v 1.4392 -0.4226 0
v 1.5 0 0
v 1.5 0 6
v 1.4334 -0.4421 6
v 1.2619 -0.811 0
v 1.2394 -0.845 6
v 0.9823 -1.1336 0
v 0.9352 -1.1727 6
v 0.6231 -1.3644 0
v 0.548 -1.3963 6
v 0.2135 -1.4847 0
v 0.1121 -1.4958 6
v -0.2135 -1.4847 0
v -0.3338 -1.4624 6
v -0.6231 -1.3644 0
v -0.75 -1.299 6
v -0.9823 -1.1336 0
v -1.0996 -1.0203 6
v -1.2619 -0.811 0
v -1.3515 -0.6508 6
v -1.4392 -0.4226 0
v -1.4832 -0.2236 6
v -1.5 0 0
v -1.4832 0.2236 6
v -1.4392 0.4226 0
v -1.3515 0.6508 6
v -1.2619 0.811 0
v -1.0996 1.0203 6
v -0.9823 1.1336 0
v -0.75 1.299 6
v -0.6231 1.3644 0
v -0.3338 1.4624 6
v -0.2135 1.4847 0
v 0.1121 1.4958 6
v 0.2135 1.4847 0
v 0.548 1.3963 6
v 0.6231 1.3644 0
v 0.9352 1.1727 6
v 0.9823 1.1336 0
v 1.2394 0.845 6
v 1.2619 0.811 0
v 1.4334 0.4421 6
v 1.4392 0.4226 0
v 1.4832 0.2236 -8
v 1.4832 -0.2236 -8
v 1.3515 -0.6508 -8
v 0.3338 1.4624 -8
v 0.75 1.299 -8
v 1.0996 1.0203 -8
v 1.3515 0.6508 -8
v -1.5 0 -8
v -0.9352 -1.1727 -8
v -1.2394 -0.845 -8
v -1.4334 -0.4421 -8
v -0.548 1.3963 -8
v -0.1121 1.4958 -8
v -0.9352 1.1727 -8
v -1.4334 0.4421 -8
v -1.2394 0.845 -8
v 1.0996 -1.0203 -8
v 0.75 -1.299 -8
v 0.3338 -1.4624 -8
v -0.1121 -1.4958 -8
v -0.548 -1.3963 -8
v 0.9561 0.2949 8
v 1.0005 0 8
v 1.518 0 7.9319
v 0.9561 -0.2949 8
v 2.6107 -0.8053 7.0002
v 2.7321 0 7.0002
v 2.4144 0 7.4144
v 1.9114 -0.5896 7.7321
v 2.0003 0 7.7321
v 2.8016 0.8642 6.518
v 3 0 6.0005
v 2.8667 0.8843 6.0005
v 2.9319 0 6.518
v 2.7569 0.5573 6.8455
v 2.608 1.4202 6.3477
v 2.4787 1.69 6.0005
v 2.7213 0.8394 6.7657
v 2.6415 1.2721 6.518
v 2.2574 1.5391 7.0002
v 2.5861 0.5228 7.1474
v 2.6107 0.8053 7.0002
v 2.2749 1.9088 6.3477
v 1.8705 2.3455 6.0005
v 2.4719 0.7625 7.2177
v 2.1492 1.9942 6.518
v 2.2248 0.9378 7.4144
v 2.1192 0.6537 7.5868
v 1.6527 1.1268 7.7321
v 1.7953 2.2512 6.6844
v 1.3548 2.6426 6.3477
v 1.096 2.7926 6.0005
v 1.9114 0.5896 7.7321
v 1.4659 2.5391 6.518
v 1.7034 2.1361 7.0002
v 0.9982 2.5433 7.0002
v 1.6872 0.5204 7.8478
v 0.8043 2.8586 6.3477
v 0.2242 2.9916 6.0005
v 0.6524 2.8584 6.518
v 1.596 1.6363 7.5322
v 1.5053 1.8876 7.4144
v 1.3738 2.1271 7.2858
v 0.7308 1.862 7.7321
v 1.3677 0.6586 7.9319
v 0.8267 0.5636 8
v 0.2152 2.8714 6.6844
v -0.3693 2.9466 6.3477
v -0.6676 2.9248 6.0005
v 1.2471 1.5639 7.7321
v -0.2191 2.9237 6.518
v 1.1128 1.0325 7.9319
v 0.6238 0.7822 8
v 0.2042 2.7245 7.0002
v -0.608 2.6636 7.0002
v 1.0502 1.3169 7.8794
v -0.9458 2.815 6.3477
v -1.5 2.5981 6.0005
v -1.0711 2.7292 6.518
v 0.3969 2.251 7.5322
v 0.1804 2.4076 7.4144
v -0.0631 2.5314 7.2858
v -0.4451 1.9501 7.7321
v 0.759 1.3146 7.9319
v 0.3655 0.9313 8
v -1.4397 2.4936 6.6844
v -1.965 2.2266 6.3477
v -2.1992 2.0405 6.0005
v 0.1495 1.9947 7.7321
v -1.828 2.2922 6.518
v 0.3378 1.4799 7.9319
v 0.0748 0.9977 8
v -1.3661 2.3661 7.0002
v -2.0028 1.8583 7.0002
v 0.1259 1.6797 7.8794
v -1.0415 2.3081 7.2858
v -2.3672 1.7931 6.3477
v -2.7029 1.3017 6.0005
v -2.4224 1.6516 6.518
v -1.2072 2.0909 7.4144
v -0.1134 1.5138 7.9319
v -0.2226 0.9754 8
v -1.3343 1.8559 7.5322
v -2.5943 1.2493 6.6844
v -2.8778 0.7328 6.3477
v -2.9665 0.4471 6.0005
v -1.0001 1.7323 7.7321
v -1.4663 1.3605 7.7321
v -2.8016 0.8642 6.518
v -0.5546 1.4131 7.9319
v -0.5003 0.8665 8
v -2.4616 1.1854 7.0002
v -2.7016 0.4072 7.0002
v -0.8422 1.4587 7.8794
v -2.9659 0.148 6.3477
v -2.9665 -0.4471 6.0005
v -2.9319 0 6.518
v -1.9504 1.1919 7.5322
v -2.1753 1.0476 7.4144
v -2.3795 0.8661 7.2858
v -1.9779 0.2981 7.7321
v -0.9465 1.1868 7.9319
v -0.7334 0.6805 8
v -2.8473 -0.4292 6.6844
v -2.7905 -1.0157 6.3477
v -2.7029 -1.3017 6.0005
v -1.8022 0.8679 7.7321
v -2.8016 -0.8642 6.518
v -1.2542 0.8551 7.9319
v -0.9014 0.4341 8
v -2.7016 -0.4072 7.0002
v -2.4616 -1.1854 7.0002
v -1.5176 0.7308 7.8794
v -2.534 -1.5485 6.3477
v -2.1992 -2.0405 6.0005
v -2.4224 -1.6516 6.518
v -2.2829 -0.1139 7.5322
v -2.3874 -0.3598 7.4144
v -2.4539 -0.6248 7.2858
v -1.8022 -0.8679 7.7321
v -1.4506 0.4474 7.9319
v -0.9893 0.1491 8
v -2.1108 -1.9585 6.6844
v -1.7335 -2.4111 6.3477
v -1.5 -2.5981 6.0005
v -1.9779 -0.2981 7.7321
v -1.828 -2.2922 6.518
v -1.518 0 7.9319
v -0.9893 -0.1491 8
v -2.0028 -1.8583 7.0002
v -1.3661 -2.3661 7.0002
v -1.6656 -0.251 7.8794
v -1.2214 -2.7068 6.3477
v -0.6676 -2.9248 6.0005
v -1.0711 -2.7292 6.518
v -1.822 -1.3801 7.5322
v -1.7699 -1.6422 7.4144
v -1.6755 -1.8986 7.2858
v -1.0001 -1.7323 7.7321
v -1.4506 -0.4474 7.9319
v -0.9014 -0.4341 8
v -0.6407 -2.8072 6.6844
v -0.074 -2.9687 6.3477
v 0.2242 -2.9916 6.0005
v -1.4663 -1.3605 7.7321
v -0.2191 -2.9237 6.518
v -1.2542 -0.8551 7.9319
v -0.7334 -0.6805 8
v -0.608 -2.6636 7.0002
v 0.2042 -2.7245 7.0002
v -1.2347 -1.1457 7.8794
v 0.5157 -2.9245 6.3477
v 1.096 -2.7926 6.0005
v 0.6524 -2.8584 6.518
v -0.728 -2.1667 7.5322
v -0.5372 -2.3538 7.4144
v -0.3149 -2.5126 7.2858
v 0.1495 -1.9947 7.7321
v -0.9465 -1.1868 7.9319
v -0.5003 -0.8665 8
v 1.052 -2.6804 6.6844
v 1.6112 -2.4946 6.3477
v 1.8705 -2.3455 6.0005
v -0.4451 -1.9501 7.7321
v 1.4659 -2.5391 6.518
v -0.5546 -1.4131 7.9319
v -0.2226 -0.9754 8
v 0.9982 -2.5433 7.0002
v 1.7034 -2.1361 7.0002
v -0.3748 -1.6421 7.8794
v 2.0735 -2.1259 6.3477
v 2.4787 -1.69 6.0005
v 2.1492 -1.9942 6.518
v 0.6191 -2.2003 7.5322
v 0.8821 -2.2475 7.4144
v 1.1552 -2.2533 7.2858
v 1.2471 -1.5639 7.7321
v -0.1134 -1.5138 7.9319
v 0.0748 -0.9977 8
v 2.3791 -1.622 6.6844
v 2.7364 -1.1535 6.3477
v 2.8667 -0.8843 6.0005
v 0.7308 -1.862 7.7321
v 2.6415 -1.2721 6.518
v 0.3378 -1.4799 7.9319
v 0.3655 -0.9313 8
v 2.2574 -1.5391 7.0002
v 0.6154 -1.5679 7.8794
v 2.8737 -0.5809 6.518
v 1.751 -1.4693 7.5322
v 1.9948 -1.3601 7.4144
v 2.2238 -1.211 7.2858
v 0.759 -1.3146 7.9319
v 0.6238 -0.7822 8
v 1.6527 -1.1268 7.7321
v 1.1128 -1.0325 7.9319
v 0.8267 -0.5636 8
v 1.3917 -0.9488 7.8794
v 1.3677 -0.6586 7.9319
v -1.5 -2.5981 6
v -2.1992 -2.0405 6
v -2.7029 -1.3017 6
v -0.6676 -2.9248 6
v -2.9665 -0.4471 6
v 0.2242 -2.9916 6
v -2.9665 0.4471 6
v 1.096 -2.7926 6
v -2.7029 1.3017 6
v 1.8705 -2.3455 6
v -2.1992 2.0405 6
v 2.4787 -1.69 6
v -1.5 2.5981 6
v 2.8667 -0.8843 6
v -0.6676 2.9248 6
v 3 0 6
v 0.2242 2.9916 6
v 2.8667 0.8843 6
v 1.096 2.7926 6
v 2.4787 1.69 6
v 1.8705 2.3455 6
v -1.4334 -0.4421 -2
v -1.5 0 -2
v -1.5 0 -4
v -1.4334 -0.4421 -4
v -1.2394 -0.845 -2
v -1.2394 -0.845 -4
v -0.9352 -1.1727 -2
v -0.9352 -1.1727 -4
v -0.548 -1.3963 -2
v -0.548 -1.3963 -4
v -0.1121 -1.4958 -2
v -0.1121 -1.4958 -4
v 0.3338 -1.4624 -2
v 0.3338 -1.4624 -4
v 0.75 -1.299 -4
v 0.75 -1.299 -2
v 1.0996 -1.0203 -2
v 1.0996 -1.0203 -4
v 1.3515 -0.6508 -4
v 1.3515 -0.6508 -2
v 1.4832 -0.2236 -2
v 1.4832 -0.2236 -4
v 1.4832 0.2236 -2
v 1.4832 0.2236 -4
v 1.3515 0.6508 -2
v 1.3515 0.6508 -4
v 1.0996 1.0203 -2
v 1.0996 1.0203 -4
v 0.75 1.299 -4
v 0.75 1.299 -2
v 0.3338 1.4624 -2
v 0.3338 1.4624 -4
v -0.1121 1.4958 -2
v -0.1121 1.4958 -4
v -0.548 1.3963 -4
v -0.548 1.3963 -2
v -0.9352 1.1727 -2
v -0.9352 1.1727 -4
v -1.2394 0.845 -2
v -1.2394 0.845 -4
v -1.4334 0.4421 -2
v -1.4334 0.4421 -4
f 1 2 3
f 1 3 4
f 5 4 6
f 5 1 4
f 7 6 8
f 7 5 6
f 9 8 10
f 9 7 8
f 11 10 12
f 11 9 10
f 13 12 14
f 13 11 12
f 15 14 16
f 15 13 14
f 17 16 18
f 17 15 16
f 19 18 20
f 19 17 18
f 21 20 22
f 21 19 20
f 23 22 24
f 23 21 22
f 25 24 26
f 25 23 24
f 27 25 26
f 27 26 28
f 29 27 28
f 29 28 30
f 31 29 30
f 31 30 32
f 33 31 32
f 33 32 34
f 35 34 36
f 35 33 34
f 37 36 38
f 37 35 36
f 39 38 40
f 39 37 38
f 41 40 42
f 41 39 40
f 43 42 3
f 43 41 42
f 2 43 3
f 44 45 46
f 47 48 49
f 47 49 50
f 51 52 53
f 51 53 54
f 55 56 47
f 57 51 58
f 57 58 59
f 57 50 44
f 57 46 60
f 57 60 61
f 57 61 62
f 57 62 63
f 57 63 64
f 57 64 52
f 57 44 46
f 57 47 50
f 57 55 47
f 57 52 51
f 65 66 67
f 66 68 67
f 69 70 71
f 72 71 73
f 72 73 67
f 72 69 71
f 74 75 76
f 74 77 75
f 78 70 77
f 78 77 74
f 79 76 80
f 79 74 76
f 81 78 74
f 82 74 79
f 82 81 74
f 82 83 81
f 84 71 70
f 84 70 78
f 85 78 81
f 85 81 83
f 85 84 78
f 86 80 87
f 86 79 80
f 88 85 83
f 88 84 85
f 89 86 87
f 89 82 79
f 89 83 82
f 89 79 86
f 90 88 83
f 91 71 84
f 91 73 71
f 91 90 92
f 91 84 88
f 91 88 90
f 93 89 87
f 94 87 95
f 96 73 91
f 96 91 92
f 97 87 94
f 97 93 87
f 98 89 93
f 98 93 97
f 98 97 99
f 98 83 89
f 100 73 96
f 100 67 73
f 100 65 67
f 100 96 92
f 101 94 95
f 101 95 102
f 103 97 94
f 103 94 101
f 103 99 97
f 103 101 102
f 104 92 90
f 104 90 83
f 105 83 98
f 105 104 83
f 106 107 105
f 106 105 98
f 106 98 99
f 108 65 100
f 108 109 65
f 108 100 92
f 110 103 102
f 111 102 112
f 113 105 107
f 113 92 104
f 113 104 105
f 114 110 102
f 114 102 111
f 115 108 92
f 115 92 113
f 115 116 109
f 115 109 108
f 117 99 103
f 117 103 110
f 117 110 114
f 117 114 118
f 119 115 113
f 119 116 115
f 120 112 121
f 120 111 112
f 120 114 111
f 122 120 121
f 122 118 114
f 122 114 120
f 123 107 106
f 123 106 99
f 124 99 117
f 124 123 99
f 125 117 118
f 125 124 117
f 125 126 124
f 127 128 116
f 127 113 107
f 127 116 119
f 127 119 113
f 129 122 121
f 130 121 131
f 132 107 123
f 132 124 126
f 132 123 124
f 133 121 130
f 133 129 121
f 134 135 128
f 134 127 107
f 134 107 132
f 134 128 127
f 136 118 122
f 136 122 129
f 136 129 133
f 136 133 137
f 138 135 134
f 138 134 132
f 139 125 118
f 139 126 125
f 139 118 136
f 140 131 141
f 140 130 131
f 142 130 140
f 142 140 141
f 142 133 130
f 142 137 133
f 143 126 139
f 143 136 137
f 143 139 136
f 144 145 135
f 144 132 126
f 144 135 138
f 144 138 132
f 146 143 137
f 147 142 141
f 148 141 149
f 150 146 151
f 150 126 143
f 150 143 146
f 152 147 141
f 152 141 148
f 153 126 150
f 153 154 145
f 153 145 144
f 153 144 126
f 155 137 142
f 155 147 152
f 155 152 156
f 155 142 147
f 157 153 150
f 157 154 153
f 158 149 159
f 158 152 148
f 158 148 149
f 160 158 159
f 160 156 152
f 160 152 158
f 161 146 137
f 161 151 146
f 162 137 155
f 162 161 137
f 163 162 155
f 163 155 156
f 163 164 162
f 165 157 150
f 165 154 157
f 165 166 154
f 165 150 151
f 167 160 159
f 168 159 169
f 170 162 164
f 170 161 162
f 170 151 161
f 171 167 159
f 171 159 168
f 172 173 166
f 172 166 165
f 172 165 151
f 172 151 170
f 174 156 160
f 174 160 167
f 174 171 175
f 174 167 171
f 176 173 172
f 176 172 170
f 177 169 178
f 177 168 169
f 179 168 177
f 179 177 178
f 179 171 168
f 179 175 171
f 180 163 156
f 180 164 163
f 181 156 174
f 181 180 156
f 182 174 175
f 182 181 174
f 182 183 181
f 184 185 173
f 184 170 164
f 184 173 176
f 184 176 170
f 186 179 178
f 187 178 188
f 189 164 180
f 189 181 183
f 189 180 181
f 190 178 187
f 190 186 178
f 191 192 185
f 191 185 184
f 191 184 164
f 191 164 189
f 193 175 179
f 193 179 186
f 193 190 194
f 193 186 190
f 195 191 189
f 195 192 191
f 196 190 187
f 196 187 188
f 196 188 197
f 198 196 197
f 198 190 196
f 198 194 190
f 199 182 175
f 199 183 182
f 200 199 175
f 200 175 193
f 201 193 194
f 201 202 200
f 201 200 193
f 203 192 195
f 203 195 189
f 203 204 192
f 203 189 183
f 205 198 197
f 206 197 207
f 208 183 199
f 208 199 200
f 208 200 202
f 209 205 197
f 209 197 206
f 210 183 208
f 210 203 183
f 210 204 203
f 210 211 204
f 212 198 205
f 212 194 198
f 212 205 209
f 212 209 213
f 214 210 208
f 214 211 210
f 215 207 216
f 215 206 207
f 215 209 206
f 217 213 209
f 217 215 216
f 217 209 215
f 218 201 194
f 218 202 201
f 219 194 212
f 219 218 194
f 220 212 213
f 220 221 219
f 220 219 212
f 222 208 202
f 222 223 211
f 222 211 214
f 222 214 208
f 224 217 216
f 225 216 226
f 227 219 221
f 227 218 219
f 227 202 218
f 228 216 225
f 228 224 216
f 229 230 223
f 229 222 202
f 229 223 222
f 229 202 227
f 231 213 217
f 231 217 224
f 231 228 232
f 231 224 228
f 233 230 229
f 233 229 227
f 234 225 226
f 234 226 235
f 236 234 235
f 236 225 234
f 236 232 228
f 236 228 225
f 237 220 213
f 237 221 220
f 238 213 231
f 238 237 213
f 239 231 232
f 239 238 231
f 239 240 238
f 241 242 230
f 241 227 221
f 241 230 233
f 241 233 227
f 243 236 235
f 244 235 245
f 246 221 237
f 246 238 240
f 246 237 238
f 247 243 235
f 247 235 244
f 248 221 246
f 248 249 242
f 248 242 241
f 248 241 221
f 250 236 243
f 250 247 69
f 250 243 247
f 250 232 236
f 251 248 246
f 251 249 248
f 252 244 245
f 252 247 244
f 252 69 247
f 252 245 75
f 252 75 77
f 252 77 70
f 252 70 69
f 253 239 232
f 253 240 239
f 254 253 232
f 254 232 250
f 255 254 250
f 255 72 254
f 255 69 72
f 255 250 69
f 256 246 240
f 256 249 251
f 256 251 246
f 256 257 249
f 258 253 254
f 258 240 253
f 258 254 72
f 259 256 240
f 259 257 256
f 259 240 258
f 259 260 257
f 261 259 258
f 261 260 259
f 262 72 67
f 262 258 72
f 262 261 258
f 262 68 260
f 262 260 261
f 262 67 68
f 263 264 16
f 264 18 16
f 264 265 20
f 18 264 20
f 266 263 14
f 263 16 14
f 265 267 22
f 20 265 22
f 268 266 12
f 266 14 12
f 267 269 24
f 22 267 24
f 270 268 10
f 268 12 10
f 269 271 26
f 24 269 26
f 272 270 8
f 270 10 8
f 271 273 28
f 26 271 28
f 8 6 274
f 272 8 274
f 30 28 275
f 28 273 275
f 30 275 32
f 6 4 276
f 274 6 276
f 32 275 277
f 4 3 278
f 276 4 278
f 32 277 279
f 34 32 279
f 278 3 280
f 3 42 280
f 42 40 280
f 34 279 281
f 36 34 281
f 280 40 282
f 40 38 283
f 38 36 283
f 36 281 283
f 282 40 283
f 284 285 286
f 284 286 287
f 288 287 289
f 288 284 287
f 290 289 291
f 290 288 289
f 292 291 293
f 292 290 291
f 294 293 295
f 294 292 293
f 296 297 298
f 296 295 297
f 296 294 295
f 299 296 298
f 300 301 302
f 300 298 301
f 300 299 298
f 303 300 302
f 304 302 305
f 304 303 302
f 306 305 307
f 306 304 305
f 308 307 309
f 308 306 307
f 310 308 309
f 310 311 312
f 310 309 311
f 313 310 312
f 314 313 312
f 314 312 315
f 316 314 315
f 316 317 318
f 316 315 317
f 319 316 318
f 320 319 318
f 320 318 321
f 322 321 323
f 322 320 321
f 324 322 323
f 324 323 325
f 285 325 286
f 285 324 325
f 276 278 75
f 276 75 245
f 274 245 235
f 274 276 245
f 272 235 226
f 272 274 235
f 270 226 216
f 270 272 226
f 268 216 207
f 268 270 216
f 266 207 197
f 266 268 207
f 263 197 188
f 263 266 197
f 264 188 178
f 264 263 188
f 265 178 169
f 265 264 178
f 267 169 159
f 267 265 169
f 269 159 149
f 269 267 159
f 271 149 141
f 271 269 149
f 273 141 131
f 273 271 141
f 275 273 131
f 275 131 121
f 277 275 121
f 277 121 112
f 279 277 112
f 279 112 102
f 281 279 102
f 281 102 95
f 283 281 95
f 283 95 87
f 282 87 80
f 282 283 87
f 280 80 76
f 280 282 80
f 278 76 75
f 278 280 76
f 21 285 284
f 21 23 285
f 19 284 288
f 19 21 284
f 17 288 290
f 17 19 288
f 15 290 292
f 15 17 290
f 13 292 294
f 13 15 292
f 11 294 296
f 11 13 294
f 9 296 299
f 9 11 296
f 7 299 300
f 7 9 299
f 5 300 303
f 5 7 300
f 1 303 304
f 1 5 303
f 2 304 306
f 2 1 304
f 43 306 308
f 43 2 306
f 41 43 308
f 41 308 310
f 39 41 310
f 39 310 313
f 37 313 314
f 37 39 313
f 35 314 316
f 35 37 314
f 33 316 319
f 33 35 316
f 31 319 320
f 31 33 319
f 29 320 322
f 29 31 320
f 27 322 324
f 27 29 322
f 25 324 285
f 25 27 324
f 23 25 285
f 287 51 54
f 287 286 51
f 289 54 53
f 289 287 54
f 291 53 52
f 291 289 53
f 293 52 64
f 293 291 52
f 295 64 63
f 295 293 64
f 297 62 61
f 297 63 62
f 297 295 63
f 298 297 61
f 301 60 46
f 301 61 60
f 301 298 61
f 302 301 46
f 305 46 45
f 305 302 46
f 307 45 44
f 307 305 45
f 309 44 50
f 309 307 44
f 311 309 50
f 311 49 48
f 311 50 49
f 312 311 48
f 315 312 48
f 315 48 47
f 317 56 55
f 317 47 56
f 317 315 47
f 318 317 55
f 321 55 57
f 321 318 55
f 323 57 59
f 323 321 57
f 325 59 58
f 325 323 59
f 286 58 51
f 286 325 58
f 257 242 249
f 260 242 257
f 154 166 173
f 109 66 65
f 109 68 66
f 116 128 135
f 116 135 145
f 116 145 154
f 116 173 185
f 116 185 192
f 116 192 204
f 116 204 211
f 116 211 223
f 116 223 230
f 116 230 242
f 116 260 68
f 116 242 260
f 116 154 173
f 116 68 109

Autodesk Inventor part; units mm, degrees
ref_plane "YZ Plane" through (0, 0, 0) normal (1, 0, 0) x (0, 1, 0)
ref_plane "XZ Plane" through (0, 0, 0) normal (0, 1, 0) x (-1, 0, 0)
ref_plane "XY Plane" through (0, 0, 0) normal (0, 0, 1) x (1, 0, 0)
sketch "スケッチ1" plane through (0, 0, 0) normal (0, 0, 1) x (1, 0, 0)
  circle A0 centre (0, 0) radius 1.5
  dimension "d0" = 3
extrude "押し出し1" add sketch "スケッチ1" along normal blind 6
sketch "スケッチ2" plane through (0, 0, 6) normal (0, 0, 1) x (1, 0, 0)
  circle A0 centre (0, 0) radius 1.5 projected
  circle A1 centre (0, 0) radius 3
  dimension "d3" = 6
extrude "押し出し2" add sketch "スケッチ2" along normal blind 2 contours A0 | A1
fillet "フィレット1" radius 2 1 edges at (-3, 0, 8)
thread "ねじ1" size "M3x0.5" class "6g" standard "ANSI Metric M Profile" full length
sketch "スケッチ3" plane through (0, 0, 0) normal (0, 0, -1) x (-1, 0, 0)
  circle A0 centre (0, 0) radius 1.5 projected
extrude "押し出し3" add sketch "スケッチ3" along normal blind 2
sketch "スケッチ4" plane through (0, 0, -2) normal (0, 0, -1) x (-1, 0, 0)
  circle A0 centre (0, 0) radius 1.5 projected
extrude "押し出し4" add sketch "スケッチ4" along normal blind 2
sketch "スケッチ5" plane through (0, 0, -4) normal (0, 0, -1) x (-1, 0, 0)
  circle A0 centre (0, 0) radius 1.5 projected
extrude "押し出し5" add sketch "スケッチ5" along normal blind 4
properties part number "SB　14mmなべネジ" material "Steel, Mild"
